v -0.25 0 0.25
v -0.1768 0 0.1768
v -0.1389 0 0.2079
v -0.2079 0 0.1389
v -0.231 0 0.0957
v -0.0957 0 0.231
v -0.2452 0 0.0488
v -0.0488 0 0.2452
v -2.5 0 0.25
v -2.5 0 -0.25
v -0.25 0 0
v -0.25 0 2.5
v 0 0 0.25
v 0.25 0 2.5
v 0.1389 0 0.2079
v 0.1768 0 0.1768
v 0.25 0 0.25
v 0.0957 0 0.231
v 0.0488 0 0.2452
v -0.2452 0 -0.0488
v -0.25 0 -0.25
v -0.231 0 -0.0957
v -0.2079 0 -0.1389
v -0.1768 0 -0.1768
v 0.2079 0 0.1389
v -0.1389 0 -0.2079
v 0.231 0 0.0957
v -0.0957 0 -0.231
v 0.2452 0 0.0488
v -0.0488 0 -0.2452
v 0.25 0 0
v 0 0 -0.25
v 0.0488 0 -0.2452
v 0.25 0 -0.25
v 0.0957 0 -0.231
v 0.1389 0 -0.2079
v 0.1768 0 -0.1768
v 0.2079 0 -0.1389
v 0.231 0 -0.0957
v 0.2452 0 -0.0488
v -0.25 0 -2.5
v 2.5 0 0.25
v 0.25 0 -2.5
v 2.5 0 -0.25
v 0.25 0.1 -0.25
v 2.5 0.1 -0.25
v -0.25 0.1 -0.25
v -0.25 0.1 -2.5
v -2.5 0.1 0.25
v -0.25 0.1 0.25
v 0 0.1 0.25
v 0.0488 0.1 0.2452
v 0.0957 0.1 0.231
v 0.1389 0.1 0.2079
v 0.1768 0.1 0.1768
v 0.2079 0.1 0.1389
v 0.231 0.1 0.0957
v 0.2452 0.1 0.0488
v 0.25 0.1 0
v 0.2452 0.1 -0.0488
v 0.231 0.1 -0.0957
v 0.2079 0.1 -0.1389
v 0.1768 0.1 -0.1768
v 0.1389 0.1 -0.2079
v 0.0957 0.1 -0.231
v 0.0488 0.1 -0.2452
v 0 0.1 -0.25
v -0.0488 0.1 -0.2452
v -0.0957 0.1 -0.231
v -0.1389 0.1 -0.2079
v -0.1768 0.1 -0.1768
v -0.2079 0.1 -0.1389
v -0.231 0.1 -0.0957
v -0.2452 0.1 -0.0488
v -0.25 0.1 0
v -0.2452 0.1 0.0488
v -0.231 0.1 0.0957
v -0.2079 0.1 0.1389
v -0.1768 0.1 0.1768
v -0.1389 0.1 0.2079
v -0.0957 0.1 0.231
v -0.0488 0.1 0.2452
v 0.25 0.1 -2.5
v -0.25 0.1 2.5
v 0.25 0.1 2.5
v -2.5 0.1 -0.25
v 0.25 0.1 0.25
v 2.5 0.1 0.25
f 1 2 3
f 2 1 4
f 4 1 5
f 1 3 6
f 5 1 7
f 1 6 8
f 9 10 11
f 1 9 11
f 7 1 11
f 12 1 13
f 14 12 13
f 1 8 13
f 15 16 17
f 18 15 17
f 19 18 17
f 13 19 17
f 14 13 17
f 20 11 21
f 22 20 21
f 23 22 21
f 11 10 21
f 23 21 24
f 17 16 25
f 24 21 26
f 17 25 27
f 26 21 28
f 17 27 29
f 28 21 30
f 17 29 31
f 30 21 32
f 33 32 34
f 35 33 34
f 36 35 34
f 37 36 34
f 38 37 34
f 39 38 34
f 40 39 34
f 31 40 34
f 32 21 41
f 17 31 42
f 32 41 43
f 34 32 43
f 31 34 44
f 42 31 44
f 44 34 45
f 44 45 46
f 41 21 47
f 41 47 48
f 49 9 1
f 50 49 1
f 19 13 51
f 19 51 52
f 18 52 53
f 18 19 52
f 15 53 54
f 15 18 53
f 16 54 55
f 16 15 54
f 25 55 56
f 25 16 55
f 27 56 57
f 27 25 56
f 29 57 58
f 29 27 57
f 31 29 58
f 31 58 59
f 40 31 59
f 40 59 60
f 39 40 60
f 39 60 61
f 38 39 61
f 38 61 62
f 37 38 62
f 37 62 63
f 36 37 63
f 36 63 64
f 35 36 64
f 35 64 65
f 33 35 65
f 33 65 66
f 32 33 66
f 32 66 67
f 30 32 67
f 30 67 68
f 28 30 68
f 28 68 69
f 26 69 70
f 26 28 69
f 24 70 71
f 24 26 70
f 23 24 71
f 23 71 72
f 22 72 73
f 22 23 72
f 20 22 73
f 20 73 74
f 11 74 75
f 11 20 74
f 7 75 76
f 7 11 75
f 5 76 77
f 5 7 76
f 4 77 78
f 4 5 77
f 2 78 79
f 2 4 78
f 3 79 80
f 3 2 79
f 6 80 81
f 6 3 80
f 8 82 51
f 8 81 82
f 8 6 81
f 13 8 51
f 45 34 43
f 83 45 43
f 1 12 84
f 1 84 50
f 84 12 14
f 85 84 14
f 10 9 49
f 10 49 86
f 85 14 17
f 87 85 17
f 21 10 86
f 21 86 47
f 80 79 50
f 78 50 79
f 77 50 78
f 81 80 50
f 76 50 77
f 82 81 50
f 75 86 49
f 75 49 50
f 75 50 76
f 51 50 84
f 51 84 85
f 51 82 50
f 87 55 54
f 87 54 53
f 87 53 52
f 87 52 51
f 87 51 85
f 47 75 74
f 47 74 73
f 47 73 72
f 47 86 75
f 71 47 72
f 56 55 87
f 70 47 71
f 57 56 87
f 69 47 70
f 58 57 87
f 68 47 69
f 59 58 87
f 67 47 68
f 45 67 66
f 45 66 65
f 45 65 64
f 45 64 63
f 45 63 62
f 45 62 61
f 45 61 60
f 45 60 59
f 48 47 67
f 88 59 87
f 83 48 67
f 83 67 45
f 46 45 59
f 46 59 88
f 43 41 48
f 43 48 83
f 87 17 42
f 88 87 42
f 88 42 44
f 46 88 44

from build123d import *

# Parameters (mm, degrees)
SKETCH1_W               = 5
SKETCH1_H               = 0.5
BOSS_EXTRUDE1_DEPTH     = 0.1
SKETCH2_W               = 0.5
SKETCH2_H               = 5
BOSS_EXTRUDE2_DEPTH     = 0.1
CUT_EXTRUDE1_DEPTH      = 4.536947837
CUT_EXTRUDE1_DEPTH_BACK = 4.536947837
SKETCH3_R               = 0.25


with BuildPart() as part:
    # Sketch1 → Boss-Extrude1 (new body)
    with BuildSketch(Plane(origin=(0, 0, 0), x_dir=(1, 0, 0), z_dir=(0, 1, 0))):
        Rectangle(SKETCH1_W, SKETCH1_H)
    extrude(amount=BOSS_EXTRUDE1_DEPTH)

    # Sketch2 → Boss-Extrude2 (add)
    with BuildSketch(Plane(origin=(0, 0, 0), x_dir=(1, 0, 0), z_dir=(0, 1, 0))):
        Rectangle(SKETCH2_W, SKETCH2_H)
    extrude(amount=BOSS_EXTRUDE2_DEPTH)

    # Sketch3 → Cut-Extrude1 (cut, two sides: drawn at the far end of the back side and taken through both)
    with BuildSketch(Plane(origin=(0, 0.1, 0), x_dir=(1, 0, 0), z_dir=(0, 1, 0)).offset(-CUT_EXTRUDE1_DEPTH_BACK)):
        with Locations(Location((0, 0, 0), (0, 0, 270))):
            Circle(SKETCH3_R)
    extrude(amount=CUT_EXTRUDE1_DEPTH + CUT_EXTRUDE1_DEPTH_BACK, mode=Mode.SUBTRACT)


solid = part.part
